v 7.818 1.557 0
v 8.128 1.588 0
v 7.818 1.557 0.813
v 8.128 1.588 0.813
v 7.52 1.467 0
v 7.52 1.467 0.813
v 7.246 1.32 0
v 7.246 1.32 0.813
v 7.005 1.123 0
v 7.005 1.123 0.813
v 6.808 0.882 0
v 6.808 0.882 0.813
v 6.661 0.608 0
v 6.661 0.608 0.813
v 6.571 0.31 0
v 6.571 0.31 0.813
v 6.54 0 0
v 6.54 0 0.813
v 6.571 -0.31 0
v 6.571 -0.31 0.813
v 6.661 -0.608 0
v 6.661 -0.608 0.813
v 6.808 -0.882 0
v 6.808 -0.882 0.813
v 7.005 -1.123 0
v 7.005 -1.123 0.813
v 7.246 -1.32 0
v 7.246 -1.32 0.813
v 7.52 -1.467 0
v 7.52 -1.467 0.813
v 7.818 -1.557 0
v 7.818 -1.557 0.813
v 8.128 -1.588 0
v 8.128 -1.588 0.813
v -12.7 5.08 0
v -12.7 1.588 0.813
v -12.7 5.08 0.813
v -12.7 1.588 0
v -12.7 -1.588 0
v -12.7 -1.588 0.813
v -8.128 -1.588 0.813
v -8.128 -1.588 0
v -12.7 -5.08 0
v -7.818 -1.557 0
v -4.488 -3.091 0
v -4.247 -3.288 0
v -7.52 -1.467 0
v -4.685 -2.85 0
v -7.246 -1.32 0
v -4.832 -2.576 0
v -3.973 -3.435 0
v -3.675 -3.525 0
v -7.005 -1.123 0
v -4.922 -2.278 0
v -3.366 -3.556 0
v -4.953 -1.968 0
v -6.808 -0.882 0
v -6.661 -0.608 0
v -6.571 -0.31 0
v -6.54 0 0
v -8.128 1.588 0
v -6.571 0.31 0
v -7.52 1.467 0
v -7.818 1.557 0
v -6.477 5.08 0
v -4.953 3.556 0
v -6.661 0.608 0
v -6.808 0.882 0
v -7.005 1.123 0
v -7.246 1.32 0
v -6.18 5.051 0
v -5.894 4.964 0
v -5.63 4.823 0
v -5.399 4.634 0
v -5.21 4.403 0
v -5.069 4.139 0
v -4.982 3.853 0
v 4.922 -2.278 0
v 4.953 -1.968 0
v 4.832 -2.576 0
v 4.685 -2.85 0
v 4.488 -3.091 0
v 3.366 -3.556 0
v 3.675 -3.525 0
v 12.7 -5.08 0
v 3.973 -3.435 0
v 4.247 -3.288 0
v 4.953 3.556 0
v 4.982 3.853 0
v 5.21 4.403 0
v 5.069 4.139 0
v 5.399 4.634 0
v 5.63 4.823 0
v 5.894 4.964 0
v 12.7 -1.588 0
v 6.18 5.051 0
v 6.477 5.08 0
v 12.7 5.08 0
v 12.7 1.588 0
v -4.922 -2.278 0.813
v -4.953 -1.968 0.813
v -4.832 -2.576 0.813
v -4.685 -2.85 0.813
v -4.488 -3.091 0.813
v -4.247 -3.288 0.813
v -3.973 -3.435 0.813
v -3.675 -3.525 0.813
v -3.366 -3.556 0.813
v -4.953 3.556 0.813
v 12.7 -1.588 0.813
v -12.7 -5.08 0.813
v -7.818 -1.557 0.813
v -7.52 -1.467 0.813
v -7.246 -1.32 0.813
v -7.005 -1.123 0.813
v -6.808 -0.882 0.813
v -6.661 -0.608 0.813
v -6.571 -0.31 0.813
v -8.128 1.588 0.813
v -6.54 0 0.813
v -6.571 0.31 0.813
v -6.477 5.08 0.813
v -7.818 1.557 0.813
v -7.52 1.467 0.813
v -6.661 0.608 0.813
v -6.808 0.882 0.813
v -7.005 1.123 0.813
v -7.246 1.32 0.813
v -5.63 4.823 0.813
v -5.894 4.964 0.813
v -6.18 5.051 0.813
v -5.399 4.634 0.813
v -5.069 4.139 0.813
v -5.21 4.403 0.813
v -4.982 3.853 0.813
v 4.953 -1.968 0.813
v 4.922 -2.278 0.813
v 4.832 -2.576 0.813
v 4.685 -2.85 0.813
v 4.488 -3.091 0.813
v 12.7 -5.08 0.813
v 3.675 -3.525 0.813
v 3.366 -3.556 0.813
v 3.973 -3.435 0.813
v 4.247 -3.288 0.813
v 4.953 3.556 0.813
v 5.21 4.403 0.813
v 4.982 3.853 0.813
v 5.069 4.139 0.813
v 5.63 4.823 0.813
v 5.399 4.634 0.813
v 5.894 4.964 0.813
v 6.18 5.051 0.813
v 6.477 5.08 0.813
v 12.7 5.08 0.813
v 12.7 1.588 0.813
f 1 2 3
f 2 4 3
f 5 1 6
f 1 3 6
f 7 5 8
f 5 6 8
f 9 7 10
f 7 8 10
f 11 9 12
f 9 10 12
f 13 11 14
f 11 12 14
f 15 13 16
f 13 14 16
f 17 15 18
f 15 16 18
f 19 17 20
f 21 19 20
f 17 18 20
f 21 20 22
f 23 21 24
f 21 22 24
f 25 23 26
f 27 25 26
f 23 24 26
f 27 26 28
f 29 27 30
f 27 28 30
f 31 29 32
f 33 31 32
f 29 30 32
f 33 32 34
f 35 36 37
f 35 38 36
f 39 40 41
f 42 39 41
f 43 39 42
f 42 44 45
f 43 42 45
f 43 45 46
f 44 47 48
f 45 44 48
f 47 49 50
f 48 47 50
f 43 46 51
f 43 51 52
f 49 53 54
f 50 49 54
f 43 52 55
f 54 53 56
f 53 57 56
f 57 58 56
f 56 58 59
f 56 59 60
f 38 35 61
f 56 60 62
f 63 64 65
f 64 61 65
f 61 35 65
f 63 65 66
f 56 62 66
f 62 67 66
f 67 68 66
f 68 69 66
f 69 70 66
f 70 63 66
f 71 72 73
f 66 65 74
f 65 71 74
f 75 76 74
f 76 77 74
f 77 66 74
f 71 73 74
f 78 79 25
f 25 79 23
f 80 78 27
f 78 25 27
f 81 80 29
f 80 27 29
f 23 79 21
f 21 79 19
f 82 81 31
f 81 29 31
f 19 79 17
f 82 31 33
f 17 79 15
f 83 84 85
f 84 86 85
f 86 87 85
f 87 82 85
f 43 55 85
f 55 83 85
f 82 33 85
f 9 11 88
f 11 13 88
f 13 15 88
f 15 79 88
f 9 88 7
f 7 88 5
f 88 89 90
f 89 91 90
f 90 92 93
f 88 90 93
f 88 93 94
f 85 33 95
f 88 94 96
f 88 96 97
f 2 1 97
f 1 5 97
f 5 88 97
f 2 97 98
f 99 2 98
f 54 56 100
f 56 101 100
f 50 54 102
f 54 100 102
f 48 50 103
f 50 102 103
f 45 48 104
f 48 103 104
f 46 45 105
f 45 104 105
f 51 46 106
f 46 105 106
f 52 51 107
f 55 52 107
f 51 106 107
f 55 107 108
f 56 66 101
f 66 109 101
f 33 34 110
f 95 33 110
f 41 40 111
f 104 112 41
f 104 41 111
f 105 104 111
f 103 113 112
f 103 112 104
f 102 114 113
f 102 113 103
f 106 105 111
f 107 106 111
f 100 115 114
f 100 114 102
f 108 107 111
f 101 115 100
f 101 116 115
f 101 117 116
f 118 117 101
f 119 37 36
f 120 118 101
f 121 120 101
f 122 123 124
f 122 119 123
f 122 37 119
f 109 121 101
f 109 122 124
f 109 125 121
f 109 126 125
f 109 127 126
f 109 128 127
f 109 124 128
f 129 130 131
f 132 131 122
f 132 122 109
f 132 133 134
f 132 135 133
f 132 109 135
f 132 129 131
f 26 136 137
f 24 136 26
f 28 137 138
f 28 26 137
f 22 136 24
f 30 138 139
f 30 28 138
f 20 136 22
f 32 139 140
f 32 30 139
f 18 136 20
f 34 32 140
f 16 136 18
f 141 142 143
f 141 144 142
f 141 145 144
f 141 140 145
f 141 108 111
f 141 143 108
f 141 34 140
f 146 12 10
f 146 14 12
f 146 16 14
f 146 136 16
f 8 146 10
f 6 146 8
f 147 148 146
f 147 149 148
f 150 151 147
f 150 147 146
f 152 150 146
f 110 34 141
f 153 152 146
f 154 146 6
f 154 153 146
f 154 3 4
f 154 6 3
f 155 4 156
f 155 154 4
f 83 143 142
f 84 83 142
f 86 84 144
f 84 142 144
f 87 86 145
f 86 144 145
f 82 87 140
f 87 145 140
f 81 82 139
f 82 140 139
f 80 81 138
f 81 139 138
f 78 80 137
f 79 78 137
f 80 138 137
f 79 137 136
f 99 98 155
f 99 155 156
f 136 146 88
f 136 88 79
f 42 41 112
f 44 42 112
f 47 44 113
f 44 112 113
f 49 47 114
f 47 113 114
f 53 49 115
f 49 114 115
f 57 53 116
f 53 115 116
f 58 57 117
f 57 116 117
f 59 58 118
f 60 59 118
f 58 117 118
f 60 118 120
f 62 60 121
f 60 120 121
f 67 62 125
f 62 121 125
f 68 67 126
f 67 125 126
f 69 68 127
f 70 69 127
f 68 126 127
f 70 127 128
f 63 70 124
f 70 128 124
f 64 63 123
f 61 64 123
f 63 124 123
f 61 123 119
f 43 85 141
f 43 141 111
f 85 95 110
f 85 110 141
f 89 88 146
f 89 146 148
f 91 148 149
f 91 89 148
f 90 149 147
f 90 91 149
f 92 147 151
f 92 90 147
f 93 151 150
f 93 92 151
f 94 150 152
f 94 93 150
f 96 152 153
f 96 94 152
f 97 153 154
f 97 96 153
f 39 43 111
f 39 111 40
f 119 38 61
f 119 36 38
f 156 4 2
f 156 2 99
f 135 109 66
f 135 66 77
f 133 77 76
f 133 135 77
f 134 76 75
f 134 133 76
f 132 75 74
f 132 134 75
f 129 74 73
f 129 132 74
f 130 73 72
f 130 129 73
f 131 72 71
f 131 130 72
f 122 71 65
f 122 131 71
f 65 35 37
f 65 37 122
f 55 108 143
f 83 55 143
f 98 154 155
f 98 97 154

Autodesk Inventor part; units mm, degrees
ref_plane "YZ Plane" through (0, 0, 0) normal (1, 0, 0) x (0, 1, 0)
ref_plane "XZ Plane" through (0, 0, 0) normal (0, 1, 0) x (-1, 0, 0)
sketch "Sketch1" plane through (0, 0, 0) normal (0, 0, 1) x (1, 0, 0)
  line L0 (-12.7, 5.08) -> (12.7, 5.08)
  line L1 (12.7, 5.08) -> (12.7, -5.08)
  line L2 (12.7, -5.08) -> (-12.7, -5.08)
  line L3 (-12.7, -5.08) -> (-12.7, 5.08)
  point P0 (0, 0)
  point P1 (0, 5.08)
  point P2 (-12.7, 0)
  dimension "d0" = 25.4
  dimension "d1" = 10.16
extrude "Extrusion1" add sketch "Sketch1" along normal blind 0.8128
ref_plane "Work Plane1" through (0, 0, 13.5128) normal (0, 0, 1) x (1, 0, 0)
sketch "Sketch2" plane through (0, 0, 13.5128) normal (0, 0, 1) x (1, 0, 0)
  line L0 (12.7, 5.08) -> (12.7, -5.08) projected
  line L1 (-12.7, 5.08) -> (12.7, 5.08) projected
  line L2 (-12.7, -5.08) -> (-12.7, 5.08) projected
  line L3 (12.7, -5.08) -> (-12.7, -5.08) projected
  line L4 (-3.3655, 3.556) -> (3.3655, 3.556)
  line L5 (-3.3655, -3.556) -> (3.3655, -3.556)
  line L6 (-4.953, 1.9685) -> (-4.953, -1.9685)
  line L7 (4.953, 1.9685) -> (4.953, -1.9685)
  arc A0 (-3.3655, 3.556) -> (-4.953, 1.9685) centre (-3.3655, 1.9685) ccw
  arc A1 (-4.953, -1.9685) -> (-3.3655, -3.556) centre (-3.3655, -1.9685) ccw
  arc A2 (3.3655, -3.556) -> (4.953, -1.9685) centre (3.3655, -1.9685) ccw
  arc A3 (4.953, 1.9685) -> (3.3655, 3.556) centre (3.3655, 1.9685) ccw
  point P0 (0, 0)
  point P1 (0, 3.556)
  point P2 (0, -3.556)
  point P3 (-4.953, 0)
  point P4 (4.953, 0)
  dimension "d5" = 6.731
  dimension "d6" = 6.731
  dimension "d7" = 3.937
  dimension "d8" = 3.937
  dimension "d9" = 4.953
  dimension "d10" = 4.953
  dimension "d11" = 3.556
  dimension "d12" = 3.556
  dimension "d13" = 1.5875
  dimension "d14" = 1.5875
  dimension "d15" = 1.5875
  dimension "d16" = 1.5875
extrude "Extrusion2" cut sketch "Sketch2" against normal blind 25.4 contours L4 A3 L7 A2 L5 A1 L6 A0
sketch "Sketch3" plane through (0, 0, 13.5128) normal (0, 0, 1) x (1, 0, 0)
  arc A0 (-3.3655, 3.556) -> (-4.953, 1.9685) centre (-3.3655, 1.9685) ccw projected
  line L0 (-3.3655, 3.556) -> (3.3655, 3.556) projected
  arc A1 (4.953, 1.9685) -> (3.3655, 3.556) centre (3.3655, 1.9685) ccw projected
  line L1 (4.953, 1.9685) -> (4.953, -1.9685) projected
  arc A2 (3.3655, -3.556) -> (4.953, -1.9685) centre (3.3655, -1.9685) ccw projected
  line L2 (3.3655, -3.556) -> (-3.3655, -3.556) projected
  arc A3 (-4.953, -1.9685) -> (-3.3655, -3.556) centre (-3.3655, -1.9685) ccw projected
  line L3 (-4.953, -1.9685) -> (-4.953, 1.9685) projected
  line L4 (12.7, 5.08) -> (12.7, -5.08) projected
  line L5 (-12.7, 5.08) -> (12.7, 5.08) projected
  line L6 (-12.7, -5.08) -> (-12.7, 5.08) projected
  line L7 (12.7, -5.08) -> (-12.7, -5.08) projected
  line L8 (-12.7, 1.5875) -> (-8.128, 1.5875)
  line L9 (-12.7, -1.5875) -> (-8.128, -1.5875)
  arc A4 (-8.128, -1.5875) -> (-8.128, 1.5875) centre (-8.128, 0) ccw
  point P0 (0, 0)
  dimension "d19" = 4.572
  dimension "d20" = 3.4925
  dimension "d21" = 4.572
  dimension "d22" = 3.175
  dimension "d24" = 1.5875
extrude "Extrusion3" cut sketch "Sketch3" against normal blind 25.4 contours L8 A4 L9 L6
mirror "Mirror1" about plane through (0, 0, 0) normal (1, 0, 0) of "Extrusion3"
sketch "Sketch5" plane through (0, 0, 0.8128) normal (0, 0, 1) x (1, 0, 0)
  line L0 (4.953, 1.9685) -> (4.953, -1.9685) construction
  line L1 (-4.953, -1.9685) -> (4.953, -1.9685)
  line L2 (4.953, -1.9685) -> (4.953, 7.0011)
  line L3 (4.953, 7.0011) -> (-4.953, 7.0011)
  line L4 (-4.953, 7.0011) -> (-4.953, -1.9685)
  point P0 (0, 0)
extrude "Extrusion5" cut sketch "Sketch5" against normal blind 25.4
fillet "Fillet1" radius 1.524 2 edges at (-4.953, 5.08, 0.4064) (4.953, 5.08, 0.4064)
sketch "Sketch6" plane through (0, 0, 0.8128) normal (0, 0, 1) x (1, 0, 0)
  arc A0 (6.477, 5.08) -> (4.953, 3.556) centre (6.477, 3.556) ccw construction
  line L0 (4.953, 3.556) -> (4.953, -1.9685) construction
  arc A1 (3.3655, -3.556) -> (4.953, -1.9685) centre (3.3655, -1.9685) ccw construction
  line L1 (3.3655, -3.556) -> (-3.3655, -3.556) construction
  arc A2 (-4.953, -1.9685) -> (-3.3655, -3.556) centre (-3.3655, -1.9685) ccw construction
  line L2 (-4.953, -1.9685) -> (-4.953, 3.556) construction
  arc A3 (-4.953, 3.556) -> (-6.477, 5.08) centre (-6.477, 3.556) ccw construction
  line L3 (-12.7, 5.08) -> (-6.477, 5.08) construction
  line L4 (-12.7, 1.5875) -> (-12.7, 5.08) construction
  line L5 (-12.7, 1.5875) -> (-8.128, 1.5875) construction
  arc A4 (-8.128, -1.5875) -> (-8.128, 1.5875) centre (-8.128, 0) ccw construction
  line L6 (-8.128, -1.5875) -> (-12.7, -1.5875) construction
  line L7 (-12.7, -5.08) -> (-12.7, -1.5875) construction
  line L8 (12.7, -5.08) -> (-12.7, -5.08) construction
  line L9 (12.7, -1.5875) -> (12.7, -5.08) construction
  line L10 (12.7, -1.5875) -> (8.128, -1.5875) construction
  arc A5 (8.128, 1.5875) -> (8.128, -1.5875) centre (8.128, 0) ccw construction
  line L11 (8.128, 1.5875) -> (12.7, 1.5875) construction
  line L12 (12.7, 5.08) -> (12.7, 1.5875) construction
  line L13 (6.477, 5.08) -> (12.7, 5.08) construction
  point P0 (0, 0)
properties part number "headplate_largerCenter_frontcutout"
